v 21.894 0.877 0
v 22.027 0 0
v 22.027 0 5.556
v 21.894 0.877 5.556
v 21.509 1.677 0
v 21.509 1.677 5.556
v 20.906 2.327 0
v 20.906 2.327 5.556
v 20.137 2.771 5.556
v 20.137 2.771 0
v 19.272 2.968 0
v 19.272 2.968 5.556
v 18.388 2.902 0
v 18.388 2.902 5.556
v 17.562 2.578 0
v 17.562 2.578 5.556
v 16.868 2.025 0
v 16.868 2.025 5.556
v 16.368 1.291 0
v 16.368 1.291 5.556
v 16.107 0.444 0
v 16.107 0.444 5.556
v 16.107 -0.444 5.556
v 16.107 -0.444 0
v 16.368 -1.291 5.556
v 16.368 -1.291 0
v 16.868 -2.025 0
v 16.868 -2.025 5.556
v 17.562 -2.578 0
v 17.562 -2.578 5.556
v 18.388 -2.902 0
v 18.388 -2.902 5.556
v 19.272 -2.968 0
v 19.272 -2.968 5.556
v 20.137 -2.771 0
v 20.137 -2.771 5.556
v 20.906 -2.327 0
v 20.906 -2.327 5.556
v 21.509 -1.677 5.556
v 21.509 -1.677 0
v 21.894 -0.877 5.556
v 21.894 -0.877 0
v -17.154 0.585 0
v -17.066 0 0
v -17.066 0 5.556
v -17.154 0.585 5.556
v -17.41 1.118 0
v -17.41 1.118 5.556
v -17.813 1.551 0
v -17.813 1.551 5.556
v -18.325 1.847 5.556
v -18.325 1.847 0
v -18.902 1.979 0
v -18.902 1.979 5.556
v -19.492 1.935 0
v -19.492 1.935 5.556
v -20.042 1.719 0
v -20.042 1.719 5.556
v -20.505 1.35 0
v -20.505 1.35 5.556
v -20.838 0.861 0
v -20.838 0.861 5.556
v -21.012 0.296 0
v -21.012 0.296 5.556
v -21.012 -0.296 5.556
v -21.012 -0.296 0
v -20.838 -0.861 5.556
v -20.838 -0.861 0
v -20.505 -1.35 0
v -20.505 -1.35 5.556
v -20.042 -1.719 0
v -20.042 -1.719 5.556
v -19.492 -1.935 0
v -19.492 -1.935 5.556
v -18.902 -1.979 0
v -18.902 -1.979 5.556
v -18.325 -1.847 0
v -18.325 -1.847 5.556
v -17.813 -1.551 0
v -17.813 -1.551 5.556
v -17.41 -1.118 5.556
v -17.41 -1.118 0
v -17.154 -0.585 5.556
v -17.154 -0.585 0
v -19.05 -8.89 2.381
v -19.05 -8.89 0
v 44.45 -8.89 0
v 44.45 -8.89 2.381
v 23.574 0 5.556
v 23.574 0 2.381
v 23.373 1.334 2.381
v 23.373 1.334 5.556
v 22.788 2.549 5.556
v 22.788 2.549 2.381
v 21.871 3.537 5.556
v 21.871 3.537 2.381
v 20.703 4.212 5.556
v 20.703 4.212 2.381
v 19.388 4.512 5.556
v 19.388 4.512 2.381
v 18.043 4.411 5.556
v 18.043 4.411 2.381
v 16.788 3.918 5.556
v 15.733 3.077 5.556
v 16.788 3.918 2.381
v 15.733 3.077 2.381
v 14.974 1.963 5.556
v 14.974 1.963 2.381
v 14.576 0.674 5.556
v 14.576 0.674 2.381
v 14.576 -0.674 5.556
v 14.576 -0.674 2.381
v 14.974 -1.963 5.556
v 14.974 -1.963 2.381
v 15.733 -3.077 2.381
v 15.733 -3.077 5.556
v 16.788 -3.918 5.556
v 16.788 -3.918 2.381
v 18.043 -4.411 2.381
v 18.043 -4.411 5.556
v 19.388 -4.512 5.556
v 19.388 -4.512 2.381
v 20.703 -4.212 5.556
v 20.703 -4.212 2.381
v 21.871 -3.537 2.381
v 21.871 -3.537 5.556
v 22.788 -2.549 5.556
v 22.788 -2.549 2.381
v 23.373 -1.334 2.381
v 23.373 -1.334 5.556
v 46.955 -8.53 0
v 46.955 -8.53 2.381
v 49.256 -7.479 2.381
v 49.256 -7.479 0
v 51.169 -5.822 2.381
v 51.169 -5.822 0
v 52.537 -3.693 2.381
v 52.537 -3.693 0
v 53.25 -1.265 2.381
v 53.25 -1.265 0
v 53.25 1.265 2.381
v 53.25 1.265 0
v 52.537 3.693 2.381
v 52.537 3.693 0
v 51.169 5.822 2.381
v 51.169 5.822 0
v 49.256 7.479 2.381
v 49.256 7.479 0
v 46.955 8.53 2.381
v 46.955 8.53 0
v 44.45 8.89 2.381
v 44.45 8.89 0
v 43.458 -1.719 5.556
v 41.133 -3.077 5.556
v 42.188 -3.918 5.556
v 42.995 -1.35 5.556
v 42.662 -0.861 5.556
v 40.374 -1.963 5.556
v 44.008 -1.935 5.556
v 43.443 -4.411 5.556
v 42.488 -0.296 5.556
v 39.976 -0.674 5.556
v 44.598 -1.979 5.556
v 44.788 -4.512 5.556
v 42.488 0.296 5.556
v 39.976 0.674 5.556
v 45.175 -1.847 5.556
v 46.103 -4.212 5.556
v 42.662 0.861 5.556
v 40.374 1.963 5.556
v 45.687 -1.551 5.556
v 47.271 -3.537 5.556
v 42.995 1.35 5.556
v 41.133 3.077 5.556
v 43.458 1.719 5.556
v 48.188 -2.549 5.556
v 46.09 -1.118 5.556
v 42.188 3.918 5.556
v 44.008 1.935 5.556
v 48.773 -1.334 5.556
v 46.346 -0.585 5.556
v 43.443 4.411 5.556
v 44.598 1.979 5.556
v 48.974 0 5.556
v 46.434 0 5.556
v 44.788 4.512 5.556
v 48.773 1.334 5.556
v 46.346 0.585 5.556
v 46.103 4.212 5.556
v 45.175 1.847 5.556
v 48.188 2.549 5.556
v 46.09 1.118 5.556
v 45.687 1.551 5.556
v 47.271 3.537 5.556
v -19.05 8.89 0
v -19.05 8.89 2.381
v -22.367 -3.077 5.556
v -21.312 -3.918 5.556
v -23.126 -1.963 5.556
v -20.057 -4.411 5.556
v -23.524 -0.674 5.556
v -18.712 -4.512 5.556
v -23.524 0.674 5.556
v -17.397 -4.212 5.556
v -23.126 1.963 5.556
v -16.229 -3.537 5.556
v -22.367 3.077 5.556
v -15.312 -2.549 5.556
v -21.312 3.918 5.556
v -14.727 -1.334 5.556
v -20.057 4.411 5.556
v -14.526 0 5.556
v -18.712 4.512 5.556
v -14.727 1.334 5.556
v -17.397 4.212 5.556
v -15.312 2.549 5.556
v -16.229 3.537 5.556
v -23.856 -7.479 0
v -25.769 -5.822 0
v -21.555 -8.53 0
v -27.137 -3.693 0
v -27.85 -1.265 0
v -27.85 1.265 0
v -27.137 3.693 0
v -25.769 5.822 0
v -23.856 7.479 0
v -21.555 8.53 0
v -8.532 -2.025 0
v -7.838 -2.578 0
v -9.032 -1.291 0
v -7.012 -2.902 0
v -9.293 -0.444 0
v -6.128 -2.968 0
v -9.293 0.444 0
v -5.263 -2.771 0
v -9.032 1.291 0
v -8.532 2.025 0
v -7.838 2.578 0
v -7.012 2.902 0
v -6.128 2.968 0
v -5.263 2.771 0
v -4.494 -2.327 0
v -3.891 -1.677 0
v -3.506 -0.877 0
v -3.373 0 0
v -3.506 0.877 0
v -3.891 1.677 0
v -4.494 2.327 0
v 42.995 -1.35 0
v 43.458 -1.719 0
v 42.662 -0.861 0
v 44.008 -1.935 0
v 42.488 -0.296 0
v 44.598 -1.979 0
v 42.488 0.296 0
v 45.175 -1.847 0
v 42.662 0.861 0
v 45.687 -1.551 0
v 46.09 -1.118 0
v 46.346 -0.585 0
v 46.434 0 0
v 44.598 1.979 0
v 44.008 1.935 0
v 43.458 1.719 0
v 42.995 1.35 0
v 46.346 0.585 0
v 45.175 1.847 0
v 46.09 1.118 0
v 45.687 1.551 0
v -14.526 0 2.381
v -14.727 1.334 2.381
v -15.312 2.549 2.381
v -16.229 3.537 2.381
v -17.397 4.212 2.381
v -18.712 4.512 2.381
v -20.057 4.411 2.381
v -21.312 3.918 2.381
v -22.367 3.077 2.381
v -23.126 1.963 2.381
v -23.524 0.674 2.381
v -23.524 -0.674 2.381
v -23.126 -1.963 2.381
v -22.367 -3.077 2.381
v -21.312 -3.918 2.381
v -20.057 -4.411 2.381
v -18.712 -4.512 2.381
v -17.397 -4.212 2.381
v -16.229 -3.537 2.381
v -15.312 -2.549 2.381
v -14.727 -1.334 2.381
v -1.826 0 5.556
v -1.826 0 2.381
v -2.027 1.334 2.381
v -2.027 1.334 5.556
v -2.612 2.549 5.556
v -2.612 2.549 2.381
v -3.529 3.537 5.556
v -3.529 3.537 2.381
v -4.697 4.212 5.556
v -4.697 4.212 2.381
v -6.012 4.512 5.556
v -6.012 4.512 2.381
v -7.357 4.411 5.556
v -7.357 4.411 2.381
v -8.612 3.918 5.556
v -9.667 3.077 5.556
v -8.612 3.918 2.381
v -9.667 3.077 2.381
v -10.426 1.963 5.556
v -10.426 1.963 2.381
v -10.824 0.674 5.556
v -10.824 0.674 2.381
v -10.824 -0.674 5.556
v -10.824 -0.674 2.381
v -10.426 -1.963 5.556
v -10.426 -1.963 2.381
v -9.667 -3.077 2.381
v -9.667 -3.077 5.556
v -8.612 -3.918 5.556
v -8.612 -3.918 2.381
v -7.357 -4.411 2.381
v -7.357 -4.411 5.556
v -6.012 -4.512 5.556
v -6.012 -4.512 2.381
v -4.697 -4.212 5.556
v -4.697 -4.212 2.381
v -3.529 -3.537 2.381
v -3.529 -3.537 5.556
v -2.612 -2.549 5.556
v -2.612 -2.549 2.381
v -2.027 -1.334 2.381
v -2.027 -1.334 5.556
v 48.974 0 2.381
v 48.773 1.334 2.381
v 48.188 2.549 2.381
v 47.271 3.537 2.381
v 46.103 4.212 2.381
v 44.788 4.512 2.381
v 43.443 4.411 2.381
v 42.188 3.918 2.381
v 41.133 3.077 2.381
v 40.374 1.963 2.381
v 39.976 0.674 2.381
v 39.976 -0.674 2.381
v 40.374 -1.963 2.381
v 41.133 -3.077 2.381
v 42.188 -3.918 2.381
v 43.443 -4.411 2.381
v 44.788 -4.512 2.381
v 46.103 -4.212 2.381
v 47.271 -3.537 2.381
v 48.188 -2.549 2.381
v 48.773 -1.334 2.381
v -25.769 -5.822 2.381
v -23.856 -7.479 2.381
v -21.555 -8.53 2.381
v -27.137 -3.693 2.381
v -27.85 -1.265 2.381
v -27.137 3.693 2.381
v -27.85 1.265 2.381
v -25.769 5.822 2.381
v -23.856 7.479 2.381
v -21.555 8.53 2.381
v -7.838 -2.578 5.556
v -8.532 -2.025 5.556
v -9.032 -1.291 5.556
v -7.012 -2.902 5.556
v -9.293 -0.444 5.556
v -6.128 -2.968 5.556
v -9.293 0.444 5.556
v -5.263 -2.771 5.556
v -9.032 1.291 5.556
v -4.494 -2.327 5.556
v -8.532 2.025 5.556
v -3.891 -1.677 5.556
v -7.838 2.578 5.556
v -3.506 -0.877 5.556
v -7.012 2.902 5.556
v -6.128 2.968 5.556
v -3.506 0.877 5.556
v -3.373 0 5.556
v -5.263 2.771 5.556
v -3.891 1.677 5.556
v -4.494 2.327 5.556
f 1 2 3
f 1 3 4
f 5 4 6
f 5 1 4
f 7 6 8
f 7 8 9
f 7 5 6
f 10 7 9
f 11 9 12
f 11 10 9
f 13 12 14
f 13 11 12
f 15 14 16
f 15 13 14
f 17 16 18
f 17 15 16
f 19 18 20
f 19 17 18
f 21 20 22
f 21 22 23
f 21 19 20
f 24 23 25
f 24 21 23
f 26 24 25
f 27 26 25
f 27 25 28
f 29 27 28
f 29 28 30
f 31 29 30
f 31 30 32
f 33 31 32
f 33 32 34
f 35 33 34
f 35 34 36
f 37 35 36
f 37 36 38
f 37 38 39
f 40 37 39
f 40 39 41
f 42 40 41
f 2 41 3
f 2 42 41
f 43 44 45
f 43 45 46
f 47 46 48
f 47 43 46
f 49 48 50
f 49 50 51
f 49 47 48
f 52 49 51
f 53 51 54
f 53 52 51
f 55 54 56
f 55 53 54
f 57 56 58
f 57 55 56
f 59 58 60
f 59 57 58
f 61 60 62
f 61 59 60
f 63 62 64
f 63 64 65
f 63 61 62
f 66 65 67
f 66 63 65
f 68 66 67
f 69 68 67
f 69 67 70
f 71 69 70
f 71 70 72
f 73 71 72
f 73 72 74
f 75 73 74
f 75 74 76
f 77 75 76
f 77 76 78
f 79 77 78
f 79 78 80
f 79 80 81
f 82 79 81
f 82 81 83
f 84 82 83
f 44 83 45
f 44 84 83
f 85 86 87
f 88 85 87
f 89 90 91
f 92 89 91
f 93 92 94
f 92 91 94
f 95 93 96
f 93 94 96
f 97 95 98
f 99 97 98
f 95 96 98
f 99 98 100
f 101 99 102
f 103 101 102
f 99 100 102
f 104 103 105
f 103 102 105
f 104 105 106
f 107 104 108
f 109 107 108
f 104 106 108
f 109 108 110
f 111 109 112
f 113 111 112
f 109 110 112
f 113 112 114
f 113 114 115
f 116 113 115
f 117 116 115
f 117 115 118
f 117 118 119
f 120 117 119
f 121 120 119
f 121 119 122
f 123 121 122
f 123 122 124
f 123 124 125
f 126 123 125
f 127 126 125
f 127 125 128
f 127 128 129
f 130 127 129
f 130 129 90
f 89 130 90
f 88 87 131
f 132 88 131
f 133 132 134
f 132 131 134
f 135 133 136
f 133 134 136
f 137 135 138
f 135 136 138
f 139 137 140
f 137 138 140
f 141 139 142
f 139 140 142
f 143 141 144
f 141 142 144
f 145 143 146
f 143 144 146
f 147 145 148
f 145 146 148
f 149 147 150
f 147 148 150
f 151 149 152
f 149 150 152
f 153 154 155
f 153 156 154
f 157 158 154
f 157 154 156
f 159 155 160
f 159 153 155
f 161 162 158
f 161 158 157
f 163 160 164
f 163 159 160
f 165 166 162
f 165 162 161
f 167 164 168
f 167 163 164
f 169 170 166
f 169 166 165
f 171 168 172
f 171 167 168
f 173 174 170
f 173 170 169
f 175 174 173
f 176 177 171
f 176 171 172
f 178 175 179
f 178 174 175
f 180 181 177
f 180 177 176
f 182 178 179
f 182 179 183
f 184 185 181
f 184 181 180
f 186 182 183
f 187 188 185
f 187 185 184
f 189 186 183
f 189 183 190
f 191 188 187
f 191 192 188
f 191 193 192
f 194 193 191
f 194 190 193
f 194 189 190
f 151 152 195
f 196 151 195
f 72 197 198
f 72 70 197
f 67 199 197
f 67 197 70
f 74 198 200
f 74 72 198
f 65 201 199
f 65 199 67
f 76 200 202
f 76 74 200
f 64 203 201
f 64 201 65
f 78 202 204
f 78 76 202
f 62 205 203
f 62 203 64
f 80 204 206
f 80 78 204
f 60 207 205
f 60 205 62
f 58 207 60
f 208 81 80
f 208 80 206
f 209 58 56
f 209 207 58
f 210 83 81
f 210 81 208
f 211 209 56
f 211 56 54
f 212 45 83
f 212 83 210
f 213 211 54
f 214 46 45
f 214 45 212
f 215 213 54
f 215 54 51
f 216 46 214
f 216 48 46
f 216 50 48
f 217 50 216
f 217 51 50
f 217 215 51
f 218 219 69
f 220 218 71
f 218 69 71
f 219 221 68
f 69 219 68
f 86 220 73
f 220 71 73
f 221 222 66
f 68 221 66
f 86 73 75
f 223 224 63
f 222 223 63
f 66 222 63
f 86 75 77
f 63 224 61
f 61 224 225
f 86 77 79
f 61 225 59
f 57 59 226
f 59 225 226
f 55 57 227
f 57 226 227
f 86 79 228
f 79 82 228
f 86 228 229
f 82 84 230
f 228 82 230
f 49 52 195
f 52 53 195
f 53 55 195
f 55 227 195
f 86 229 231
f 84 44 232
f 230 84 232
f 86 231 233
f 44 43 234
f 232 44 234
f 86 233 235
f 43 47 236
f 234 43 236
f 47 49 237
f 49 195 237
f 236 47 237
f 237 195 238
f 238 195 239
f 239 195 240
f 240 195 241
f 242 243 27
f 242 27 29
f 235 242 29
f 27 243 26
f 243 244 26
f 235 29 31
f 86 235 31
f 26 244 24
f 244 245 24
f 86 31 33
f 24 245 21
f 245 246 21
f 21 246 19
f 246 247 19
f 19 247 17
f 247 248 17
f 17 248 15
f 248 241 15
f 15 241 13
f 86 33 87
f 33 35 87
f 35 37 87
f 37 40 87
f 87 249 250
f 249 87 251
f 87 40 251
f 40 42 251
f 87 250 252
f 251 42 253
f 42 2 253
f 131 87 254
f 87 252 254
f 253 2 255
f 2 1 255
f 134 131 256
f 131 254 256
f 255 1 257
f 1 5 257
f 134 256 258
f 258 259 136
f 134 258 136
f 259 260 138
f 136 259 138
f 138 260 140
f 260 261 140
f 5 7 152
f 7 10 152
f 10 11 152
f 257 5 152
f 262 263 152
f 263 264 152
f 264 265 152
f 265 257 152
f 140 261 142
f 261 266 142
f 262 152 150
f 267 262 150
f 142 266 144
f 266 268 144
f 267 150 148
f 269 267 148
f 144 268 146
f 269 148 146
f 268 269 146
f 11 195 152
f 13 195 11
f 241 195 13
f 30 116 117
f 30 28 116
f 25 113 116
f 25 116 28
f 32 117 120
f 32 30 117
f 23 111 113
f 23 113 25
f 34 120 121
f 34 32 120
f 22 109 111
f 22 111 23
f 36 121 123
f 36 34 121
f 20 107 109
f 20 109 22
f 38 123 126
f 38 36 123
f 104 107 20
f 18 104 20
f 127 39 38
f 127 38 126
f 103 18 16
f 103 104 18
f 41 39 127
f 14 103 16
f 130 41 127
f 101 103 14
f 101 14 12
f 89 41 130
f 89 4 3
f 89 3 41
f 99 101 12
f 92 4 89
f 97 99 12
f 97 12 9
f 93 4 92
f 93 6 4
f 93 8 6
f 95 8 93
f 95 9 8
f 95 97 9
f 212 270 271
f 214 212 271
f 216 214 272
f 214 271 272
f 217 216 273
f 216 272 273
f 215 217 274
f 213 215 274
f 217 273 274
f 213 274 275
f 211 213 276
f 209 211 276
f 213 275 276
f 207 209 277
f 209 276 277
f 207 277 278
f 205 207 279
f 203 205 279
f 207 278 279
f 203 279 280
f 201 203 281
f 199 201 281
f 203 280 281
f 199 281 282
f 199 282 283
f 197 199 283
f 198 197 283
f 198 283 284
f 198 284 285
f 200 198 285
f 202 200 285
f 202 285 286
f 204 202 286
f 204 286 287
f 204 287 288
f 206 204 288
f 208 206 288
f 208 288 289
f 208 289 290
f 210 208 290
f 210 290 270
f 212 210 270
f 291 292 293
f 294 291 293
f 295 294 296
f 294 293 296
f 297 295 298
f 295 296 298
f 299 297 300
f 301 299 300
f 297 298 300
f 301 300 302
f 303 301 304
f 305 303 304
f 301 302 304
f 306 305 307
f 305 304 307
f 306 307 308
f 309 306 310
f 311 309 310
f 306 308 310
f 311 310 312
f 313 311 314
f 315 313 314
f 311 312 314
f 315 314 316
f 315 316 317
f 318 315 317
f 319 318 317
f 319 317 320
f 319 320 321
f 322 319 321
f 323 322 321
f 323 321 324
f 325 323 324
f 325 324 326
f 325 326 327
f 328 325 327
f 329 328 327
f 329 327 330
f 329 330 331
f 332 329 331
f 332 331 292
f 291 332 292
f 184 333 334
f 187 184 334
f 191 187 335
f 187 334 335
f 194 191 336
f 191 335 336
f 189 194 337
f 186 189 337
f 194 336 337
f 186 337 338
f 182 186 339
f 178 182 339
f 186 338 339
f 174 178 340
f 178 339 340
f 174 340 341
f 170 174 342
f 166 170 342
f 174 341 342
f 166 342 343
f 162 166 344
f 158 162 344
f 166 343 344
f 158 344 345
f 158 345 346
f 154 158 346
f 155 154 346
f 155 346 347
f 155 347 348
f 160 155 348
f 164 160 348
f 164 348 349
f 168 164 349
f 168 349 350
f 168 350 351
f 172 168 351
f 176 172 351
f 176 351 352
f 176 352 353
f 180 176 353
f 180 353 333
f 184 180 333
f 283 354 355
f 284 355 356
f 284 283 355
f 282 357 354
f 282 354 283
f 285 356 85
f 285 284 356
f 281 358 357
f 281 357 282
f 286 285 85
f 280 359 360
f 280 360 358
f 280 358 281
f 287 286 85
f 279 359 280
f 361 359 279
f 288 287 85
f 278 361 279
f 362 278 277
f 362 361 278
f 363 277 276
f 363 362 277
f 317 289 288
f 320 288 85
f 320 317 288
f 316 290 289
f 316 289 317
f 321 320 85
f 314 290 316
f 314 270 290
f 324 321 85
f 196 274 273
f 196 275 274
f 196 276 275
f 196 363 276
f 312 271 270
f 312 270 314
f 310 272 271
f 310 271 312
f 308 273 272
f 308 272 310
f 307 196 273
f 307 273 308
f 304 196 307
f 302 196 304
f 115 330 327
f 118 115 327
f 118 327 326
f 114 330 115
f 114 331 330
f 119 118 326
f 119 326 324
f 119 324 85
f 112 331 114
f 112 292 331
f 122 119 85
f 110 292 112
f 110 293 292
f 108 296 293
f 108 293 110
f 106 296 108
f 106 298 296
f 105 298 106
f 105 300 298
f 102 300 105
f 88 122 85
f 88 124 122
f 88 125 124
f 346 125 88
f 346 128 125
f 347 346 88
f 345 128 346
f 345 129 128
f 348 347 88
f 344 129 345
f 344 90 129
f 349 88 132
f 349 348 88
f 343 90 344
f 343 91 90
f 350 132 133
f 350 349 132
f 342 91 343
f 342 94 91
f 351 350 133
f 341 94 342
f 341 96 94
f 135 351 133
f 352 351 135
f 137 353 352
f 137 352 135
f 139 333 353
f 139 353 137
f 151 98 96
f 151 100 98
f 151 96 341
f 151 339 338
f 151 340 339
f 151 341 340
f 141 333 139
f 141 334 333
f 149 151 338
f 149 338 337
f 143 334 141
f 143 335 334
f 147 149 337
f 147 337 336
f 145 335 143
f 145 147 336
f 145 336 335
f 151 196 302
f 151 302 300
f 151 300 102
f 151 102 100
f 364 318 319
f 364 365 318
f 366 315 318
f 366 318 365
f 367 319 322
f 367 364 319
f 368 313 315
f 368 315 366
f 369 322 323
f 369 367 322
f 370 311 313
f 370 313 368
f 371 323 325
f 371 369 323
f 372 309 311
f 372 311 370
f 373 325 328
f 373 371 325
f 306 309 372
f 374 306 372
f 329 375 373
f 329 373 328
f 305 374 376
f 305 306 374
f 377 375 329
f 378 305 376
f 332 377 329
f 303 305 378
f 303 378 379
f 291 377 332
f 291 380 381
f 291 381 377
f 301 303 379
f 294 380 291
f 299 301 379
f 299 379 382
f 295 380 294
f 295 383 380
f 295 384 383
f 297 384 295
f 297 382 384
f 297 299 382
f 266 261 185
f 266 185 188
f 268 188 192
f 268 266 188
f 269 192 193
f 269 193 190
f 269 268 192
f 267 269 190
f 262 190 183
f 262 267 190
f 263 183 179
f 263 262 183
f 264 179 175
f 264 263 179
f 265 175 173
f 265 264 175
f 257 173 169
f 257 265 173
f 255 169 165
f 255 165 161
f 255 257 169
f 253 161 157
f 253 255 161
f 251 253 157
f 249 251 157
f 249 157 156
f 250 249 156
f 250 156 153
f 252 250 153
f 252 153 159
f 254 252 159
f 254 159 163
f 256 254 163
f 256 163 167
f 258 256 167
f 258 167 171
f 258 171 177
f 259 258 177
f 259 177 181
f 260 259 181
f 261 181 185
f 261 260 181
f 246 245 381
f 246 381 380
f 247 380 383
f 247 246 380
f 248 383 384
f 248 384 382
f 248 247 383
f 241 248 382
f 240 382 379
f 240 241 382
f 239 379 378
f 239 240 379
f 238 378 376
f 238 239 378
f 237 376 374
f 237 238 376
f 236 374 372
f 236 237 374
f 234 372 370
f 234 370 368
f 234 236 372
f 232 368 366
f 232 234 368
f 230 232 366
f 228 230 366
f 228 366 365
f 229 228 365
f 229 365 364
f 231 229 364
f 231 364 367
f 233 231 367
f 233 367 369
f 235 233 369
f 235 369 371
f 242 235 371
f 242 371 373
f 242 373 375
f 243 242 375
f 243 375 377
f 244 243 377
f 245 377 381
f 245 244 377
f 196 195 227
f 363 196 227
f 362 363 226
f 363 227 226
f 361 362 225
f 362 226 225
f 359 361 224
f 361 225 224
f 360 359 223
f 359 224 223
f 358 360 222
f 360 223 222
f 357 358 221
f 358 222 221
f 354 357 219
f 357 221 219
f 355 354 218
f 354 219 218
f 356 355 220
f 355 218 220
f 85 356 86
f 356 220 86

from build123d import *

# Parameters (mm, degrees)
F0_R     = 4.524375
F1_DEPTH = 2.38125
F0_R_2   = 1.984375
F0_R_3   = 2.976563
F2_DEPTH = 5.55625


with BuildPart() as f1:
    # F0 (on Top) → F1 (new body)
    with BuildSketch(Plane.XY):
        with BuildLine():
            ThreePointArc((-19.05, 8.89), (-27.94, 0), (-19.05, -8.89))
            Line((-19.05, -8.89), (44.45, -8.89))
            ThreePointArc((44.45, -8.89), (53.34, 0), (44.45, 8.89))
            Line((44.45, 8.89), (-19.05, 8.89))
        make_face()
        with Locations((-19.05, 0)):
            Circle(F0_R, mode=Mode.SUBTRACT)
        with Locations((-6.35, 0)):
            Circle(F0_R, mode=Mode.SUBTRACT)
        with Locations((19.05, 0)):
            Circle(F0_R, mode=Mode.SUBTRACT)
        with Locations((44.45, 0)):
            Circle(F0_R, mode=Mode.SUBTRACT)
    extrude(amount=F1_DEPTH)

    # F0 (on Top) → F2 (join)
    with BuildSketch(Plane.XY):
        with Locations((-19.05, 0)):
            Circle(F0_R)
        with Locations((-19.05, 0)):
            Circle(F0_R_2, mode=Mode.SUBTRACT)
        with Locations((-6.35, 0)):
            Circle(F0_R)
        with Locations((-6.35, 0)):
            Circle(F0_R_3, mode=Mode.SUBTRACT)
        with Locations((19.05, 0)):
            Circle(F0_R)
        with Locations((19.05, 0)):
            Circle(F0_R_3, mode=Mode.SUBTRACT)
        with Locations((44.45, 0)):
            Circle(F0_R)
        with Locations((44.45, 0)):
            Circle(F0_R_2, mode=Mode.SUBTRACT)
    extrude(amount=F2_DEPTH)


solid = f1.part
